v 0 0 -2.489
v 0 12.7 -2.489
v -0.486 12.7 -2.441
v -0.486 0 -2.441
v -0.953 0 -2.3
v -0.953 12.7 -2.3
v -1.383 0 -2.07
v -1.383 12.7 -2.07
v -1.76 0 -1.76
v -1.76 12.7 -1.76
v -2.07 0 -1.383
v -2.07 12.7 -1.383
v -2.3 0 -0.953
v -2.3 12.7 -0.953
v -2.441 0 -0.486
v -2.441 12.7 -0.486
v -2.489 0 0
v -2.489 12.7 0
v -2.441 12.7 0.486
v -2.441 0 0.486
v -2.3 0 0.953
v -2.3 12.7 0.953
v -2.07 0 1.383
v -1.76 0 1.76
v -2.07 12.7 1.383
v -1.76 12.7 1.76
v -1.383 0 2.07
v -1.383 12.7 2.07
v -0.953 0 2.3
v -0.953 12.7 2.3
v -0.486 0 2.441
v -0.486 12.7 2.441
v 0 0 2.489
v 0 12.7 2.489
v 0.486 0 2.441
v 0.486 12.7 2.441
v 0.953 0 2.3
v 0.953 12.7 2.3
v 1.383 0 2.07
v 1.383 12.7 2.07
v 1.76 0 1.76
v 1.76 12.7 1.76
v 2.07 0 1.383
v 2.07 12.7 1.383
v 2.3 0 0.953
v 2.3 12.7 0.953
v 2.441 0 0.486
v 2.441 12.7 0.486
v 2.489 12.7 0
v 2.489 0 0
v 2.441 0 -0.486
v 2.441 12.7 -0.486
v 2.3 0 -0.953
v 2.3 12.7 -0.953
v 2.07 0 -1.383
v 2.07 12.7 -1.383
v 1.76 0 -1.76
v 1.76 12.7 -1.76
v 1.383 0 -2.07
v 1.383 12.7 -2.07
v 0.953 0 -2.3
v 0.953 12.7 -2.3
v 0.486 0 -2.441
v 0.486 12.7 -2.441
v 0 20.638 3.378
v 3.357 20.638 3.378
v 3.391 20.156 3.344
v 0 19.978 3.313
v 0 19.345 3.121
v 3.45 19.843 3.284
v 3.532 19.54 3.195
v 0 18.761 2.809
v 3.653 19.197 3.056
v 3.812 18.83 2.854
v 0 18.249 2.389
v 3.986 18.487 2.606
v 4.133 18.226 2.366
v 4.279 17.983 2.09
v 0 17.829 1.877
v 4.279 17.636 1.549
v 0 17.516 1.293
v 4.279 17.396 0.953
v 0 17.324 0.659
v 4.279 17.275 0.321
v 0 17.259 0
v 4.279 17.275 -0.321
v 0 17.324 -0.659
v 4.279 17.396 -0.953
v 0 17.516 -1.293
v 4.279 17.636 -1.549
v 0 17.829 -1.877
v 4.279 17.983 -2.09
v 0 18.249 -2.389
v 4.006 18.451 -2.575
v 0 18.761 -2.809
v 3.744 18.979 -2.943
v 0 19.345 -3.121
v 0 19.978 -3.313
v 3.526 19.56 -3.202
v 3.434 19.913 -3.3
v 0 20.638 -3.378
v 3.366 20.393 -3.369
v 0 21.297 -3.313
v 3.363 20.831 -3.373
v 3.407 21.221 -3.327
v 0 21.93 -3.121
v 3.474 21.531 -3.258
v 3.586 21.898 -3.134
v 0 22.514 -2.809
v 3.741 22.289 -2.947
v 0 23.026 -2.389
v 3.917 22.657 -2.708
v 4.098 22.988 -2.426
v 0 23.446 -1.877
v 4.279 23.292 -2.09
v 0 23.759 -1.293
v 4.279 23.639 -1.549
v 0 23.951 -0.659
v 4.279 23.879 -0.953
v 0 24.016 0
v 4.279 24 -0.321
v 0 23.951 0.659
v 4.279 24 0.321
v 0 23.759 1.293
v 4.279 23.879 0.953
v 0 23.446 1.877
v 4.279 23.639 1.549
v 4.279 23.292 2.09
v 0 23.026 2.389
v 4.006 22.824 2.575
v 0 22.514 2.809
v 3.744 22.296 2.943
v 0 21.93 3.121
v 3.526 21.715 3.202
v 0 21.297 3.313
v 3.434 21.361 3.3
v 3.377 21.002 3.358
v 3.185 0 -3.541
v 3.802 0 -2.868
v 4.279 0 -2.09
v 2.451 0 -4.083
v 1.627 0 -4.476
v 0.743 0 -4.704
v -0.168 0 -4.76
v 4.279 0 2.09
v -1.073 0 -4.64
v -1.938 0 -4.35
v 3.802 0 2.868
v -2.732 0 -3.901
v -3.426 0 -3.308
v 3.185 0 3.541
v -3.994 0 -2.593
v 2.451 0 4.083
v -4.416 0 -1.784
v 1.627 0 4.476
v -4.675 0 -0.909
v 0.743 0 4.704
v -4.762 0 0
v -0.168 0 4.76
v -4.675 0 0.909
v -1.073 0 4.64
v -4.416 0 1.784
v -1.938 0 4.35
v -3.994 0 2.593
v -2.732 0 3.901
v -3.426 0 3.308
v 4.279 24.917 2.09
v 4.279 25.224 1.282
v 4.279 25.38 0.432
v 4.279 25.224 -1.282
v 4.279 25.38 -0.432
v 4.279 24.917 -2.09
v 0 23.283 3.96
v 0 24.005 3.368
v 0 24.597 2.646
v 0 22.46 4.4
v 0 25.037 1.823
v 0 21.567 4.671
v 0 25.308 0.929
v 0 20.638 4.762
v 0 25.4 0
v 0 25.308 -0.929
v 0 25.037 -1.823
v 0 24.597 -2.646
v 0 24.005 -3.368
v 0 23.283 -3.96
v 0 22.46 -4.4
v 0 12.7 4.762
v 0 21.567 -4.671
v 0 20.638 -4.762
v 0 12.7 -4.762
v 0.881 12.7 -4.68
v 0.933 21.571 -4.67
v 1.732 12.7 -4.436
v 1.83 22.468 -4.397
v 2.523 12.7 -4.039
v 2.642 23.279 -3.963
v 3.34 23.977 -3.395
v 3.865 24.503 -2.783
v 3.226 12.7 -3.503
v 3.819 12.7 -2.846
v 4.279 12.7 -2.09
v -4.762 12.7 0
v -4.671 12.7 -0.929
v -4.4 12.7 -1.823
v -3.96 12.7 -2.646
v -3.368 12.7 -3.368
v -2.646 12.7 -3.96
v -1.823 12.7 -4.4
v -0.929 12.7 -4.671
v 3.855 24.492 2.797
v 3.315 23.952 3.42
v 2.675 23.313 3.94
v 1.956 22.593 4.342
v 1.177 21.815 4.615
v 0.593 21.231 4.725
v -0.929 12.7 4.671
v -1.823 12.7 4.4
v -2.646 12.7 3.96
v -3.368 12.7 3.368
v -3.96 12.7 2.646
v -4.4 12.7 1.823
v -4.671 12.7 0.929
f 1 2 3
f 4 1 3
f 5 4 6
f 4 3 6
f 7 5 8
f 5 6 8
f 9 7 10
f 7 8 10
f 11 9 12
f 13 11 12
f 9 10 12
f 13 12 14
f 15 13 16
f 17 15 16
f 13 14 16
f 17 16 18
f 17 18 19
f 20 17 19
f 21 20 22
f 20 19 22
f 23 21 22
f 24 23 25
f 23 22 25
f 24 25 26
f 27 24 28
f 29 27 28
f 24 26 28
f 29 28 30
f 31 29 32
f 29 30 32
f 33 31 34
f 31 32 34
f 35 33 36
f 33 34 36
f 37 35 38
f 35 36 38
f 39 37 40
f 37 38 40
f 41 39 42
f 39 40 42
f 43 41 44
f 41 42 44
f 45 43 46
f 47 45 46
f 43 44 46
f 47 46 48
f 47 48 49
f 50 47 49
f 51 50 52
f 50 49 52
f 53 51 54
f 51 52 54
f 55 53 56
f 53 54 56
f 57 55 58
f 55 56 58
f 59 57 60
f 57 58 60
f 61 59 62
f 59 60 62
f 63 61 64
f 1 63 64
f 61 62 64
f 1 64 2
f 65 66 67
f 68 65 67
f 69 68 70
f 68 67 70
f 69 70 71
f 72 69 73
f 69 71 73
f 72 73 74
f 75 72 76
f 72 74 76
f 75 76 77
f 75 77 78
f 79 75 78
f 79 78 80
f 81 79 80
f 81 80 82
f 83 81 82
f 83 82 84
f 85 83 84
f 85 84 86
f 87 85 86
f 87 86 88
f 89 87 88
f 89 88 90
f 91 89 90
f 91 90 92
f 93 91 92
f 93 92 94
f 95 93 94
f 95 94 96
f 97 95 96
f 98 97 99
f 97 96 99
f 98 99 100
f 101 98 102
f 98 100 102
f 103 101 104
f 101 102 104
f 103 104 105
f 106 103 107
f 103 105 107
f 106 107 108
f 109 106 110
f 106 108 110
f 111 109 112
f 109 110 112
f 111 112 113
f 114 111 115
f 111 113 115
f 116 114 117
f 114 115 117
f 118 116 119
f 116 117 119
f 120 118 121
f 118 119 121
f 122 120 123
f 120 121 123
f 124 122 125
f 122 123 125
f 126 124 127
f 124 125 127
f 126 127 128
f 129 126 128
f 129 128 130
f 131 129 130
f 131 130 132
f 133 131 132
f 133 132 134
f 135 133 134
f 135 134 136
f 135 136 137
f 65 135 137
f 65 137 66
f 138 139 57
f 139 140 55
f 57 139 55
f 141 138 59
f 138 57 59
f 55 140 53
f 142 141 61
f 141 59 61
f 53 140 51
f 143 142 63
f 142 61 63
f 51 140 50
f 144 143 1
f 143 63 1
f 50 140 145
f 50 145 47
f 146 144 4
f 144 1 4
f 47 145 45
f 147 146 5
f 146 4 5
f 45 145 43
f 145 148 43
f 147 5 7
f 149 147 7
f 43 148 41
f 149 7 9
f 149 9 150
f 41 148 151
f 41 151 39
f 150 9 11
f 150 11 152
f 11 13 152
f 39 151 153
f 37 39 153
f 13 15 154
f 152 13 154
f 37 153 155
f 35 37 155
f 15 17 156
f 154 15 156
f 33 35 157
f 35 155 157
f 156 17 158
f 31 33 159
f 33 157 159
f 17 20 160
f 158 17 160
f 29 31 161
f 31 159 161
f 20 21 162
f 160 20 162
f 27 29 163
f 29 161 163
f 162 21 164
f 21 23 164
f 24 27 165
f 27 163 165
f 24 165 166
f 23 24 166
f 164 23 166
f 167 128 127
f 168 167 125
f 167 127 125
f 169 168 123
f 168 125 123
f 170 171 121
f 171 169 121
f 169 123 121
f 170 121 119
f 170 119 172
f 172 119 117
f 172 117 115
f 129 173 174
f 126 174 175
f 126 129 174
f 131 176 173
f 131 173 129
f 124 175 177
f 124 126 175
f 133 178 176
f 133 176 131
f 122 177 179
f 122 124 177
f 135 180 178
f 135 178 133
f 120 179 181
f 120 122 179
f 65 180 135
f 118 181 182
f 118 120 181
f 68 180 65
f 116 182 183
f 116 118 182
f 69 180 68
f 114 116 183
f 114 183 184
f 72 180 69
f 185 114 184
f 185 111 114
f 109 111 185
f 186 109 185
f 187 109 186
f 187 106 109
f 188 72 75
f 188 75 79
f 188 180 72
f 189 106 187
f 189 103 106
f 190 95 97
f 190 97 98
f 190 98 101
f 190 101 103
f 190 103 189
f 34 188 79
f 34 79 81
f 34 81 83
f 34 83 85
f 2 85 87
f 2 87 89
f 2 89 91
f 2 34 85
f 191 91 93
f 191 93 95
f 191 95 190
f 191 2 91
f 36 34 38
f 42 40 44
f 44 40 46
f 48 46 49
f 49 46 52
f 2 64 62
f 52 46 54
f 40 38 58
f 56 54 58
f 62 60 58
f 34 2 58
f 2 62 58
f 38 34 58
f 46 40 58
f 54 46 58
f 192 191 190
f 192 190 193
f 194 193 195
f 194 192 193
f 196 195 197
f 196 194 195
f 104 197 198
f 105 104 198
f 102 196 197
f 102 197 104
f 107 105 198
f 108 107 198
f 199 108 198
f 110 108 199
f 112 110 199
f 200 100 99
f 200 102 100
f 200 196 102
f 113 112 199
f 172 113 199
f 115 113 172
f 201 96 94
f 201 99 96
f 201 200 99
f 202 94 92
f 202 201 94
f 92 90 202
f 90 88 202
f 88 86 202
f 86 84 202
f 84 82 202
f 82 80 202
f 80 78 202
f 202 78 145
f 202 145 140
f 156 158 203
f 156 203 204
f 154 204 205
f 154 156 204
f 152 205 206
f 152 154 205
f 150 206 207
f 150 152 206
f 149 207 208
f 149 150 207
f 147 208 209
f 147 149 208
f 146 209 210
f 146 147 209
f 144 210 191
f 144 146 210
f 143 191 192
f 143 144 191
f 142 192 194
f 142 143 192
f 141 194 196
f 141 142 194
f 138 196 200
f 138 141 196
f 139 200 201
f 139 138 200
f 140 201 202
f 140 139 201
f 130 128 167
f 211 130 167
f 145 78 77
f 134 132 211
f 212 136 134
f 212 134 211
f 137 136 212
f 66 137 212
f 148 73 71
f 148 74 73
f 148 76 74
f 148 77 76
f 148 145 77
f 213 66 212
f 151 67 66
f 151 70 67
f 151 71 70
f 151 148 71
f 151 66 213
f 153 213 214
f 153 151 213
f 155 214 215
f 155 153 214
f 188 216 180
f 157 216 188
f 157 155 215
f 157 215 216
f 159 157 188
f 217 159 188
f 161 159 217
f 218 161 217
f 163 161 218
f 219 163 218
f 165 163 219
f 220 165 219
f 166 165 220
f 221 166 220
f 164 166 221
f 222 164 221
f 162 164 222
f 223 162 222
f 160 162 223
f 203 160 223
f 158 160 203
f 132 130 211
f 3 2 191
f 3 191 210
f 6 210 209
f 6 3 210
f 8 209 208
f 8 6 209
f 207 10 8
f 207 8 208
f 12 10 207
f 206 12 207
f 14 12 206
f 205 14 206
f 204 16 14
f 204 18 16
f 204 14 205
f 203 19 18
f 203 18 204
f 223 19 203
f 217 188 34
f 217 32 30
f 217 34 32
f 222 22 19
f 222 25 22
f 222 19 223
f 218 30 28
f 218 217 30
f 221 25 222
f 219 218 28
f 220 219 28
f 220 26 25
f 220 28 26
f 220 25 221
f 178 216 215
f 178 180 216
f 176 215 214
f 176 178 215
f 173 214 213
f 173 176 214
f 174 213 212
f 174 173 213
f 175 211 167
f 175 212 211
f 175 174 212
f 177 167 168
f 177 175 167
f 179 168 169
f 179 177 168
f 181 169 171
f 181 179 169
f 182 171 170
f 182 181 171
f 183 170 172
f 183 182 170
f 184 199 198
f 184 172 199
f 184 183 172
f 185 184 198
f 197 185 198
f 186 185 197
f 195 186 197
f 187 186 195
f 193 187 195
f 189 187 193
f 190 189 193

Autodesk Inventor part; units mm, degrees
ref_plane "YZ Plane" through (0, 0, 0) normal (1, 0, 0) x (0, 1, 0)
ref_plane "XZ Plane" through (0, 0, 0) normal (0, 1, 0) x (-1, 0, 0)
ref_plane "XY Plane" through (0, 0, 0) normal (0, 0, 1) x (1, 0, 0)
sketch "Sketch1" plane through (0, 0, 0) normal (0, 1, 0) x (-1, 0, 0)
  circle A0 centre (0, 0) radius 4.7625
  dimension "d0" = 9.525
extrude "Extrusion1" add sketch "Sketch1" along normal blind 12.7
sketch "Sketch2" plane through (0, 0, 0) normal (0, -1, 0) x (1, 0, 0)
  circle A0 centre (0, 0) radius 2.539
hole "Hole1" at (0, 0, 0) direction (0, 1, 0) diameter 4.9784 depth 19.05 tip angle 118 thread size "1/4-20 UNC" class "2B" standard "ANSI Unified Screw Threads"
sketch "Sketch3" plane through (0, 12.7, 0) normal (0, 1, 0) x (1, 0, 0)
  circle A0 centre (0, 0) radius 4.7625
  circle A1 centre (0, 0) radius 4.7625 projected
  line L0 (0, -4.7625) -> (0, 4.7625)
  dimension "d10" = 9.525
extrude "Extrusion2" add sketch "Sketch3" along normal blind 12.7 contours A0 L0 picked at (1.6786, -1.3984)
sketch "Sketch4" plane through (0, 12.7, -2.4892) normal (-1, 0, 0) x (0, 0, 1)
  line L0 (-2.2733, 0) -> (-2.2733, 12.7) projected
  line L1 (7.2517, 0) -> (7.2517, 12.7) projected
  line L2 (-2.2733, 0) -> (7.2517, 0)
  line L3 (7.2517, 0) -> (7.2517, 12.7)
  line L4 (7.2517, 12.7) -> (-2.2733, 12.7)
  line L5 (-2.2733, 12.7) -> (-2.2733, 0)
  arc A0 (7.2517, 7.9375) -> (-2.2733, 7.9375) centre (2.4892, 7.9375) ccw
  line L6 (7.2517, 12.7) -> (-2.2733, 12.7) projected
  line L7 (-2.2733, 7.9375) -> (-2.2733, 12.7)
  line L8 (-2.2733, 12.7) -> (7.2517, 12.7)
  line L9 (7.2517, 12.7) -> (7.2517, 7.9375)
  point P0 (2.4892, -12.7)
extrude "Extrusion3" cut sketch "Sketch4" against normal blind 12.7 contours L0 L4 A0 | L4 L1 A0
sketch "Sketch5" plane through (0, 12.7, -2.4892) normal (-1, 0, 0) x (0, 0, 1)
  arc A0 (7.2517, 7.9375) -> (-2.2733, 7.9375) centre (2.4892, 7.9375) ccw projected
  circle A1 centre (2.4892, 7.9375) radius 2.2013
  point P0 (2.4892, -12.7)
hole "Hole2" at (0, 20.6375, 0) direction (1, 0, 0) diameter 6.7564 depth 19.05 tip angle 118 clearance for "Flat Head Machine Screw (82)" size "1/4" standard "Ansi Unified Screw Threads"
sketch "Sketch6" plane through (0, 0, 0) normal (0, -1, 0) x (1, 0, 0)
  line L0 (0, 0) -> (4.7909, 0)
  line L1 (5.3024, 5.1468) -> (4.2794, 5.1468)
  line L2 (4.2794, 5.1468) -> (4.2794, -5.1468)
  line L3 (4.2794, -5.1468) -> (5.3024, -5.1468)
  line L4 (5.3024, -5.1468) -> (5.3024, 5.1468)
  line L5 (5.3024, 5.1468) -> (4.2794, -5.1468) construction
  line L6 (4.2794, 5.1468) -> (5.3024, -5.1468) construction
extrude "Extrusion4" cut sketch "Sketch6" against normal blind 25.4
properties part number "feet type 3 part 1" material "Stainless Steel"
